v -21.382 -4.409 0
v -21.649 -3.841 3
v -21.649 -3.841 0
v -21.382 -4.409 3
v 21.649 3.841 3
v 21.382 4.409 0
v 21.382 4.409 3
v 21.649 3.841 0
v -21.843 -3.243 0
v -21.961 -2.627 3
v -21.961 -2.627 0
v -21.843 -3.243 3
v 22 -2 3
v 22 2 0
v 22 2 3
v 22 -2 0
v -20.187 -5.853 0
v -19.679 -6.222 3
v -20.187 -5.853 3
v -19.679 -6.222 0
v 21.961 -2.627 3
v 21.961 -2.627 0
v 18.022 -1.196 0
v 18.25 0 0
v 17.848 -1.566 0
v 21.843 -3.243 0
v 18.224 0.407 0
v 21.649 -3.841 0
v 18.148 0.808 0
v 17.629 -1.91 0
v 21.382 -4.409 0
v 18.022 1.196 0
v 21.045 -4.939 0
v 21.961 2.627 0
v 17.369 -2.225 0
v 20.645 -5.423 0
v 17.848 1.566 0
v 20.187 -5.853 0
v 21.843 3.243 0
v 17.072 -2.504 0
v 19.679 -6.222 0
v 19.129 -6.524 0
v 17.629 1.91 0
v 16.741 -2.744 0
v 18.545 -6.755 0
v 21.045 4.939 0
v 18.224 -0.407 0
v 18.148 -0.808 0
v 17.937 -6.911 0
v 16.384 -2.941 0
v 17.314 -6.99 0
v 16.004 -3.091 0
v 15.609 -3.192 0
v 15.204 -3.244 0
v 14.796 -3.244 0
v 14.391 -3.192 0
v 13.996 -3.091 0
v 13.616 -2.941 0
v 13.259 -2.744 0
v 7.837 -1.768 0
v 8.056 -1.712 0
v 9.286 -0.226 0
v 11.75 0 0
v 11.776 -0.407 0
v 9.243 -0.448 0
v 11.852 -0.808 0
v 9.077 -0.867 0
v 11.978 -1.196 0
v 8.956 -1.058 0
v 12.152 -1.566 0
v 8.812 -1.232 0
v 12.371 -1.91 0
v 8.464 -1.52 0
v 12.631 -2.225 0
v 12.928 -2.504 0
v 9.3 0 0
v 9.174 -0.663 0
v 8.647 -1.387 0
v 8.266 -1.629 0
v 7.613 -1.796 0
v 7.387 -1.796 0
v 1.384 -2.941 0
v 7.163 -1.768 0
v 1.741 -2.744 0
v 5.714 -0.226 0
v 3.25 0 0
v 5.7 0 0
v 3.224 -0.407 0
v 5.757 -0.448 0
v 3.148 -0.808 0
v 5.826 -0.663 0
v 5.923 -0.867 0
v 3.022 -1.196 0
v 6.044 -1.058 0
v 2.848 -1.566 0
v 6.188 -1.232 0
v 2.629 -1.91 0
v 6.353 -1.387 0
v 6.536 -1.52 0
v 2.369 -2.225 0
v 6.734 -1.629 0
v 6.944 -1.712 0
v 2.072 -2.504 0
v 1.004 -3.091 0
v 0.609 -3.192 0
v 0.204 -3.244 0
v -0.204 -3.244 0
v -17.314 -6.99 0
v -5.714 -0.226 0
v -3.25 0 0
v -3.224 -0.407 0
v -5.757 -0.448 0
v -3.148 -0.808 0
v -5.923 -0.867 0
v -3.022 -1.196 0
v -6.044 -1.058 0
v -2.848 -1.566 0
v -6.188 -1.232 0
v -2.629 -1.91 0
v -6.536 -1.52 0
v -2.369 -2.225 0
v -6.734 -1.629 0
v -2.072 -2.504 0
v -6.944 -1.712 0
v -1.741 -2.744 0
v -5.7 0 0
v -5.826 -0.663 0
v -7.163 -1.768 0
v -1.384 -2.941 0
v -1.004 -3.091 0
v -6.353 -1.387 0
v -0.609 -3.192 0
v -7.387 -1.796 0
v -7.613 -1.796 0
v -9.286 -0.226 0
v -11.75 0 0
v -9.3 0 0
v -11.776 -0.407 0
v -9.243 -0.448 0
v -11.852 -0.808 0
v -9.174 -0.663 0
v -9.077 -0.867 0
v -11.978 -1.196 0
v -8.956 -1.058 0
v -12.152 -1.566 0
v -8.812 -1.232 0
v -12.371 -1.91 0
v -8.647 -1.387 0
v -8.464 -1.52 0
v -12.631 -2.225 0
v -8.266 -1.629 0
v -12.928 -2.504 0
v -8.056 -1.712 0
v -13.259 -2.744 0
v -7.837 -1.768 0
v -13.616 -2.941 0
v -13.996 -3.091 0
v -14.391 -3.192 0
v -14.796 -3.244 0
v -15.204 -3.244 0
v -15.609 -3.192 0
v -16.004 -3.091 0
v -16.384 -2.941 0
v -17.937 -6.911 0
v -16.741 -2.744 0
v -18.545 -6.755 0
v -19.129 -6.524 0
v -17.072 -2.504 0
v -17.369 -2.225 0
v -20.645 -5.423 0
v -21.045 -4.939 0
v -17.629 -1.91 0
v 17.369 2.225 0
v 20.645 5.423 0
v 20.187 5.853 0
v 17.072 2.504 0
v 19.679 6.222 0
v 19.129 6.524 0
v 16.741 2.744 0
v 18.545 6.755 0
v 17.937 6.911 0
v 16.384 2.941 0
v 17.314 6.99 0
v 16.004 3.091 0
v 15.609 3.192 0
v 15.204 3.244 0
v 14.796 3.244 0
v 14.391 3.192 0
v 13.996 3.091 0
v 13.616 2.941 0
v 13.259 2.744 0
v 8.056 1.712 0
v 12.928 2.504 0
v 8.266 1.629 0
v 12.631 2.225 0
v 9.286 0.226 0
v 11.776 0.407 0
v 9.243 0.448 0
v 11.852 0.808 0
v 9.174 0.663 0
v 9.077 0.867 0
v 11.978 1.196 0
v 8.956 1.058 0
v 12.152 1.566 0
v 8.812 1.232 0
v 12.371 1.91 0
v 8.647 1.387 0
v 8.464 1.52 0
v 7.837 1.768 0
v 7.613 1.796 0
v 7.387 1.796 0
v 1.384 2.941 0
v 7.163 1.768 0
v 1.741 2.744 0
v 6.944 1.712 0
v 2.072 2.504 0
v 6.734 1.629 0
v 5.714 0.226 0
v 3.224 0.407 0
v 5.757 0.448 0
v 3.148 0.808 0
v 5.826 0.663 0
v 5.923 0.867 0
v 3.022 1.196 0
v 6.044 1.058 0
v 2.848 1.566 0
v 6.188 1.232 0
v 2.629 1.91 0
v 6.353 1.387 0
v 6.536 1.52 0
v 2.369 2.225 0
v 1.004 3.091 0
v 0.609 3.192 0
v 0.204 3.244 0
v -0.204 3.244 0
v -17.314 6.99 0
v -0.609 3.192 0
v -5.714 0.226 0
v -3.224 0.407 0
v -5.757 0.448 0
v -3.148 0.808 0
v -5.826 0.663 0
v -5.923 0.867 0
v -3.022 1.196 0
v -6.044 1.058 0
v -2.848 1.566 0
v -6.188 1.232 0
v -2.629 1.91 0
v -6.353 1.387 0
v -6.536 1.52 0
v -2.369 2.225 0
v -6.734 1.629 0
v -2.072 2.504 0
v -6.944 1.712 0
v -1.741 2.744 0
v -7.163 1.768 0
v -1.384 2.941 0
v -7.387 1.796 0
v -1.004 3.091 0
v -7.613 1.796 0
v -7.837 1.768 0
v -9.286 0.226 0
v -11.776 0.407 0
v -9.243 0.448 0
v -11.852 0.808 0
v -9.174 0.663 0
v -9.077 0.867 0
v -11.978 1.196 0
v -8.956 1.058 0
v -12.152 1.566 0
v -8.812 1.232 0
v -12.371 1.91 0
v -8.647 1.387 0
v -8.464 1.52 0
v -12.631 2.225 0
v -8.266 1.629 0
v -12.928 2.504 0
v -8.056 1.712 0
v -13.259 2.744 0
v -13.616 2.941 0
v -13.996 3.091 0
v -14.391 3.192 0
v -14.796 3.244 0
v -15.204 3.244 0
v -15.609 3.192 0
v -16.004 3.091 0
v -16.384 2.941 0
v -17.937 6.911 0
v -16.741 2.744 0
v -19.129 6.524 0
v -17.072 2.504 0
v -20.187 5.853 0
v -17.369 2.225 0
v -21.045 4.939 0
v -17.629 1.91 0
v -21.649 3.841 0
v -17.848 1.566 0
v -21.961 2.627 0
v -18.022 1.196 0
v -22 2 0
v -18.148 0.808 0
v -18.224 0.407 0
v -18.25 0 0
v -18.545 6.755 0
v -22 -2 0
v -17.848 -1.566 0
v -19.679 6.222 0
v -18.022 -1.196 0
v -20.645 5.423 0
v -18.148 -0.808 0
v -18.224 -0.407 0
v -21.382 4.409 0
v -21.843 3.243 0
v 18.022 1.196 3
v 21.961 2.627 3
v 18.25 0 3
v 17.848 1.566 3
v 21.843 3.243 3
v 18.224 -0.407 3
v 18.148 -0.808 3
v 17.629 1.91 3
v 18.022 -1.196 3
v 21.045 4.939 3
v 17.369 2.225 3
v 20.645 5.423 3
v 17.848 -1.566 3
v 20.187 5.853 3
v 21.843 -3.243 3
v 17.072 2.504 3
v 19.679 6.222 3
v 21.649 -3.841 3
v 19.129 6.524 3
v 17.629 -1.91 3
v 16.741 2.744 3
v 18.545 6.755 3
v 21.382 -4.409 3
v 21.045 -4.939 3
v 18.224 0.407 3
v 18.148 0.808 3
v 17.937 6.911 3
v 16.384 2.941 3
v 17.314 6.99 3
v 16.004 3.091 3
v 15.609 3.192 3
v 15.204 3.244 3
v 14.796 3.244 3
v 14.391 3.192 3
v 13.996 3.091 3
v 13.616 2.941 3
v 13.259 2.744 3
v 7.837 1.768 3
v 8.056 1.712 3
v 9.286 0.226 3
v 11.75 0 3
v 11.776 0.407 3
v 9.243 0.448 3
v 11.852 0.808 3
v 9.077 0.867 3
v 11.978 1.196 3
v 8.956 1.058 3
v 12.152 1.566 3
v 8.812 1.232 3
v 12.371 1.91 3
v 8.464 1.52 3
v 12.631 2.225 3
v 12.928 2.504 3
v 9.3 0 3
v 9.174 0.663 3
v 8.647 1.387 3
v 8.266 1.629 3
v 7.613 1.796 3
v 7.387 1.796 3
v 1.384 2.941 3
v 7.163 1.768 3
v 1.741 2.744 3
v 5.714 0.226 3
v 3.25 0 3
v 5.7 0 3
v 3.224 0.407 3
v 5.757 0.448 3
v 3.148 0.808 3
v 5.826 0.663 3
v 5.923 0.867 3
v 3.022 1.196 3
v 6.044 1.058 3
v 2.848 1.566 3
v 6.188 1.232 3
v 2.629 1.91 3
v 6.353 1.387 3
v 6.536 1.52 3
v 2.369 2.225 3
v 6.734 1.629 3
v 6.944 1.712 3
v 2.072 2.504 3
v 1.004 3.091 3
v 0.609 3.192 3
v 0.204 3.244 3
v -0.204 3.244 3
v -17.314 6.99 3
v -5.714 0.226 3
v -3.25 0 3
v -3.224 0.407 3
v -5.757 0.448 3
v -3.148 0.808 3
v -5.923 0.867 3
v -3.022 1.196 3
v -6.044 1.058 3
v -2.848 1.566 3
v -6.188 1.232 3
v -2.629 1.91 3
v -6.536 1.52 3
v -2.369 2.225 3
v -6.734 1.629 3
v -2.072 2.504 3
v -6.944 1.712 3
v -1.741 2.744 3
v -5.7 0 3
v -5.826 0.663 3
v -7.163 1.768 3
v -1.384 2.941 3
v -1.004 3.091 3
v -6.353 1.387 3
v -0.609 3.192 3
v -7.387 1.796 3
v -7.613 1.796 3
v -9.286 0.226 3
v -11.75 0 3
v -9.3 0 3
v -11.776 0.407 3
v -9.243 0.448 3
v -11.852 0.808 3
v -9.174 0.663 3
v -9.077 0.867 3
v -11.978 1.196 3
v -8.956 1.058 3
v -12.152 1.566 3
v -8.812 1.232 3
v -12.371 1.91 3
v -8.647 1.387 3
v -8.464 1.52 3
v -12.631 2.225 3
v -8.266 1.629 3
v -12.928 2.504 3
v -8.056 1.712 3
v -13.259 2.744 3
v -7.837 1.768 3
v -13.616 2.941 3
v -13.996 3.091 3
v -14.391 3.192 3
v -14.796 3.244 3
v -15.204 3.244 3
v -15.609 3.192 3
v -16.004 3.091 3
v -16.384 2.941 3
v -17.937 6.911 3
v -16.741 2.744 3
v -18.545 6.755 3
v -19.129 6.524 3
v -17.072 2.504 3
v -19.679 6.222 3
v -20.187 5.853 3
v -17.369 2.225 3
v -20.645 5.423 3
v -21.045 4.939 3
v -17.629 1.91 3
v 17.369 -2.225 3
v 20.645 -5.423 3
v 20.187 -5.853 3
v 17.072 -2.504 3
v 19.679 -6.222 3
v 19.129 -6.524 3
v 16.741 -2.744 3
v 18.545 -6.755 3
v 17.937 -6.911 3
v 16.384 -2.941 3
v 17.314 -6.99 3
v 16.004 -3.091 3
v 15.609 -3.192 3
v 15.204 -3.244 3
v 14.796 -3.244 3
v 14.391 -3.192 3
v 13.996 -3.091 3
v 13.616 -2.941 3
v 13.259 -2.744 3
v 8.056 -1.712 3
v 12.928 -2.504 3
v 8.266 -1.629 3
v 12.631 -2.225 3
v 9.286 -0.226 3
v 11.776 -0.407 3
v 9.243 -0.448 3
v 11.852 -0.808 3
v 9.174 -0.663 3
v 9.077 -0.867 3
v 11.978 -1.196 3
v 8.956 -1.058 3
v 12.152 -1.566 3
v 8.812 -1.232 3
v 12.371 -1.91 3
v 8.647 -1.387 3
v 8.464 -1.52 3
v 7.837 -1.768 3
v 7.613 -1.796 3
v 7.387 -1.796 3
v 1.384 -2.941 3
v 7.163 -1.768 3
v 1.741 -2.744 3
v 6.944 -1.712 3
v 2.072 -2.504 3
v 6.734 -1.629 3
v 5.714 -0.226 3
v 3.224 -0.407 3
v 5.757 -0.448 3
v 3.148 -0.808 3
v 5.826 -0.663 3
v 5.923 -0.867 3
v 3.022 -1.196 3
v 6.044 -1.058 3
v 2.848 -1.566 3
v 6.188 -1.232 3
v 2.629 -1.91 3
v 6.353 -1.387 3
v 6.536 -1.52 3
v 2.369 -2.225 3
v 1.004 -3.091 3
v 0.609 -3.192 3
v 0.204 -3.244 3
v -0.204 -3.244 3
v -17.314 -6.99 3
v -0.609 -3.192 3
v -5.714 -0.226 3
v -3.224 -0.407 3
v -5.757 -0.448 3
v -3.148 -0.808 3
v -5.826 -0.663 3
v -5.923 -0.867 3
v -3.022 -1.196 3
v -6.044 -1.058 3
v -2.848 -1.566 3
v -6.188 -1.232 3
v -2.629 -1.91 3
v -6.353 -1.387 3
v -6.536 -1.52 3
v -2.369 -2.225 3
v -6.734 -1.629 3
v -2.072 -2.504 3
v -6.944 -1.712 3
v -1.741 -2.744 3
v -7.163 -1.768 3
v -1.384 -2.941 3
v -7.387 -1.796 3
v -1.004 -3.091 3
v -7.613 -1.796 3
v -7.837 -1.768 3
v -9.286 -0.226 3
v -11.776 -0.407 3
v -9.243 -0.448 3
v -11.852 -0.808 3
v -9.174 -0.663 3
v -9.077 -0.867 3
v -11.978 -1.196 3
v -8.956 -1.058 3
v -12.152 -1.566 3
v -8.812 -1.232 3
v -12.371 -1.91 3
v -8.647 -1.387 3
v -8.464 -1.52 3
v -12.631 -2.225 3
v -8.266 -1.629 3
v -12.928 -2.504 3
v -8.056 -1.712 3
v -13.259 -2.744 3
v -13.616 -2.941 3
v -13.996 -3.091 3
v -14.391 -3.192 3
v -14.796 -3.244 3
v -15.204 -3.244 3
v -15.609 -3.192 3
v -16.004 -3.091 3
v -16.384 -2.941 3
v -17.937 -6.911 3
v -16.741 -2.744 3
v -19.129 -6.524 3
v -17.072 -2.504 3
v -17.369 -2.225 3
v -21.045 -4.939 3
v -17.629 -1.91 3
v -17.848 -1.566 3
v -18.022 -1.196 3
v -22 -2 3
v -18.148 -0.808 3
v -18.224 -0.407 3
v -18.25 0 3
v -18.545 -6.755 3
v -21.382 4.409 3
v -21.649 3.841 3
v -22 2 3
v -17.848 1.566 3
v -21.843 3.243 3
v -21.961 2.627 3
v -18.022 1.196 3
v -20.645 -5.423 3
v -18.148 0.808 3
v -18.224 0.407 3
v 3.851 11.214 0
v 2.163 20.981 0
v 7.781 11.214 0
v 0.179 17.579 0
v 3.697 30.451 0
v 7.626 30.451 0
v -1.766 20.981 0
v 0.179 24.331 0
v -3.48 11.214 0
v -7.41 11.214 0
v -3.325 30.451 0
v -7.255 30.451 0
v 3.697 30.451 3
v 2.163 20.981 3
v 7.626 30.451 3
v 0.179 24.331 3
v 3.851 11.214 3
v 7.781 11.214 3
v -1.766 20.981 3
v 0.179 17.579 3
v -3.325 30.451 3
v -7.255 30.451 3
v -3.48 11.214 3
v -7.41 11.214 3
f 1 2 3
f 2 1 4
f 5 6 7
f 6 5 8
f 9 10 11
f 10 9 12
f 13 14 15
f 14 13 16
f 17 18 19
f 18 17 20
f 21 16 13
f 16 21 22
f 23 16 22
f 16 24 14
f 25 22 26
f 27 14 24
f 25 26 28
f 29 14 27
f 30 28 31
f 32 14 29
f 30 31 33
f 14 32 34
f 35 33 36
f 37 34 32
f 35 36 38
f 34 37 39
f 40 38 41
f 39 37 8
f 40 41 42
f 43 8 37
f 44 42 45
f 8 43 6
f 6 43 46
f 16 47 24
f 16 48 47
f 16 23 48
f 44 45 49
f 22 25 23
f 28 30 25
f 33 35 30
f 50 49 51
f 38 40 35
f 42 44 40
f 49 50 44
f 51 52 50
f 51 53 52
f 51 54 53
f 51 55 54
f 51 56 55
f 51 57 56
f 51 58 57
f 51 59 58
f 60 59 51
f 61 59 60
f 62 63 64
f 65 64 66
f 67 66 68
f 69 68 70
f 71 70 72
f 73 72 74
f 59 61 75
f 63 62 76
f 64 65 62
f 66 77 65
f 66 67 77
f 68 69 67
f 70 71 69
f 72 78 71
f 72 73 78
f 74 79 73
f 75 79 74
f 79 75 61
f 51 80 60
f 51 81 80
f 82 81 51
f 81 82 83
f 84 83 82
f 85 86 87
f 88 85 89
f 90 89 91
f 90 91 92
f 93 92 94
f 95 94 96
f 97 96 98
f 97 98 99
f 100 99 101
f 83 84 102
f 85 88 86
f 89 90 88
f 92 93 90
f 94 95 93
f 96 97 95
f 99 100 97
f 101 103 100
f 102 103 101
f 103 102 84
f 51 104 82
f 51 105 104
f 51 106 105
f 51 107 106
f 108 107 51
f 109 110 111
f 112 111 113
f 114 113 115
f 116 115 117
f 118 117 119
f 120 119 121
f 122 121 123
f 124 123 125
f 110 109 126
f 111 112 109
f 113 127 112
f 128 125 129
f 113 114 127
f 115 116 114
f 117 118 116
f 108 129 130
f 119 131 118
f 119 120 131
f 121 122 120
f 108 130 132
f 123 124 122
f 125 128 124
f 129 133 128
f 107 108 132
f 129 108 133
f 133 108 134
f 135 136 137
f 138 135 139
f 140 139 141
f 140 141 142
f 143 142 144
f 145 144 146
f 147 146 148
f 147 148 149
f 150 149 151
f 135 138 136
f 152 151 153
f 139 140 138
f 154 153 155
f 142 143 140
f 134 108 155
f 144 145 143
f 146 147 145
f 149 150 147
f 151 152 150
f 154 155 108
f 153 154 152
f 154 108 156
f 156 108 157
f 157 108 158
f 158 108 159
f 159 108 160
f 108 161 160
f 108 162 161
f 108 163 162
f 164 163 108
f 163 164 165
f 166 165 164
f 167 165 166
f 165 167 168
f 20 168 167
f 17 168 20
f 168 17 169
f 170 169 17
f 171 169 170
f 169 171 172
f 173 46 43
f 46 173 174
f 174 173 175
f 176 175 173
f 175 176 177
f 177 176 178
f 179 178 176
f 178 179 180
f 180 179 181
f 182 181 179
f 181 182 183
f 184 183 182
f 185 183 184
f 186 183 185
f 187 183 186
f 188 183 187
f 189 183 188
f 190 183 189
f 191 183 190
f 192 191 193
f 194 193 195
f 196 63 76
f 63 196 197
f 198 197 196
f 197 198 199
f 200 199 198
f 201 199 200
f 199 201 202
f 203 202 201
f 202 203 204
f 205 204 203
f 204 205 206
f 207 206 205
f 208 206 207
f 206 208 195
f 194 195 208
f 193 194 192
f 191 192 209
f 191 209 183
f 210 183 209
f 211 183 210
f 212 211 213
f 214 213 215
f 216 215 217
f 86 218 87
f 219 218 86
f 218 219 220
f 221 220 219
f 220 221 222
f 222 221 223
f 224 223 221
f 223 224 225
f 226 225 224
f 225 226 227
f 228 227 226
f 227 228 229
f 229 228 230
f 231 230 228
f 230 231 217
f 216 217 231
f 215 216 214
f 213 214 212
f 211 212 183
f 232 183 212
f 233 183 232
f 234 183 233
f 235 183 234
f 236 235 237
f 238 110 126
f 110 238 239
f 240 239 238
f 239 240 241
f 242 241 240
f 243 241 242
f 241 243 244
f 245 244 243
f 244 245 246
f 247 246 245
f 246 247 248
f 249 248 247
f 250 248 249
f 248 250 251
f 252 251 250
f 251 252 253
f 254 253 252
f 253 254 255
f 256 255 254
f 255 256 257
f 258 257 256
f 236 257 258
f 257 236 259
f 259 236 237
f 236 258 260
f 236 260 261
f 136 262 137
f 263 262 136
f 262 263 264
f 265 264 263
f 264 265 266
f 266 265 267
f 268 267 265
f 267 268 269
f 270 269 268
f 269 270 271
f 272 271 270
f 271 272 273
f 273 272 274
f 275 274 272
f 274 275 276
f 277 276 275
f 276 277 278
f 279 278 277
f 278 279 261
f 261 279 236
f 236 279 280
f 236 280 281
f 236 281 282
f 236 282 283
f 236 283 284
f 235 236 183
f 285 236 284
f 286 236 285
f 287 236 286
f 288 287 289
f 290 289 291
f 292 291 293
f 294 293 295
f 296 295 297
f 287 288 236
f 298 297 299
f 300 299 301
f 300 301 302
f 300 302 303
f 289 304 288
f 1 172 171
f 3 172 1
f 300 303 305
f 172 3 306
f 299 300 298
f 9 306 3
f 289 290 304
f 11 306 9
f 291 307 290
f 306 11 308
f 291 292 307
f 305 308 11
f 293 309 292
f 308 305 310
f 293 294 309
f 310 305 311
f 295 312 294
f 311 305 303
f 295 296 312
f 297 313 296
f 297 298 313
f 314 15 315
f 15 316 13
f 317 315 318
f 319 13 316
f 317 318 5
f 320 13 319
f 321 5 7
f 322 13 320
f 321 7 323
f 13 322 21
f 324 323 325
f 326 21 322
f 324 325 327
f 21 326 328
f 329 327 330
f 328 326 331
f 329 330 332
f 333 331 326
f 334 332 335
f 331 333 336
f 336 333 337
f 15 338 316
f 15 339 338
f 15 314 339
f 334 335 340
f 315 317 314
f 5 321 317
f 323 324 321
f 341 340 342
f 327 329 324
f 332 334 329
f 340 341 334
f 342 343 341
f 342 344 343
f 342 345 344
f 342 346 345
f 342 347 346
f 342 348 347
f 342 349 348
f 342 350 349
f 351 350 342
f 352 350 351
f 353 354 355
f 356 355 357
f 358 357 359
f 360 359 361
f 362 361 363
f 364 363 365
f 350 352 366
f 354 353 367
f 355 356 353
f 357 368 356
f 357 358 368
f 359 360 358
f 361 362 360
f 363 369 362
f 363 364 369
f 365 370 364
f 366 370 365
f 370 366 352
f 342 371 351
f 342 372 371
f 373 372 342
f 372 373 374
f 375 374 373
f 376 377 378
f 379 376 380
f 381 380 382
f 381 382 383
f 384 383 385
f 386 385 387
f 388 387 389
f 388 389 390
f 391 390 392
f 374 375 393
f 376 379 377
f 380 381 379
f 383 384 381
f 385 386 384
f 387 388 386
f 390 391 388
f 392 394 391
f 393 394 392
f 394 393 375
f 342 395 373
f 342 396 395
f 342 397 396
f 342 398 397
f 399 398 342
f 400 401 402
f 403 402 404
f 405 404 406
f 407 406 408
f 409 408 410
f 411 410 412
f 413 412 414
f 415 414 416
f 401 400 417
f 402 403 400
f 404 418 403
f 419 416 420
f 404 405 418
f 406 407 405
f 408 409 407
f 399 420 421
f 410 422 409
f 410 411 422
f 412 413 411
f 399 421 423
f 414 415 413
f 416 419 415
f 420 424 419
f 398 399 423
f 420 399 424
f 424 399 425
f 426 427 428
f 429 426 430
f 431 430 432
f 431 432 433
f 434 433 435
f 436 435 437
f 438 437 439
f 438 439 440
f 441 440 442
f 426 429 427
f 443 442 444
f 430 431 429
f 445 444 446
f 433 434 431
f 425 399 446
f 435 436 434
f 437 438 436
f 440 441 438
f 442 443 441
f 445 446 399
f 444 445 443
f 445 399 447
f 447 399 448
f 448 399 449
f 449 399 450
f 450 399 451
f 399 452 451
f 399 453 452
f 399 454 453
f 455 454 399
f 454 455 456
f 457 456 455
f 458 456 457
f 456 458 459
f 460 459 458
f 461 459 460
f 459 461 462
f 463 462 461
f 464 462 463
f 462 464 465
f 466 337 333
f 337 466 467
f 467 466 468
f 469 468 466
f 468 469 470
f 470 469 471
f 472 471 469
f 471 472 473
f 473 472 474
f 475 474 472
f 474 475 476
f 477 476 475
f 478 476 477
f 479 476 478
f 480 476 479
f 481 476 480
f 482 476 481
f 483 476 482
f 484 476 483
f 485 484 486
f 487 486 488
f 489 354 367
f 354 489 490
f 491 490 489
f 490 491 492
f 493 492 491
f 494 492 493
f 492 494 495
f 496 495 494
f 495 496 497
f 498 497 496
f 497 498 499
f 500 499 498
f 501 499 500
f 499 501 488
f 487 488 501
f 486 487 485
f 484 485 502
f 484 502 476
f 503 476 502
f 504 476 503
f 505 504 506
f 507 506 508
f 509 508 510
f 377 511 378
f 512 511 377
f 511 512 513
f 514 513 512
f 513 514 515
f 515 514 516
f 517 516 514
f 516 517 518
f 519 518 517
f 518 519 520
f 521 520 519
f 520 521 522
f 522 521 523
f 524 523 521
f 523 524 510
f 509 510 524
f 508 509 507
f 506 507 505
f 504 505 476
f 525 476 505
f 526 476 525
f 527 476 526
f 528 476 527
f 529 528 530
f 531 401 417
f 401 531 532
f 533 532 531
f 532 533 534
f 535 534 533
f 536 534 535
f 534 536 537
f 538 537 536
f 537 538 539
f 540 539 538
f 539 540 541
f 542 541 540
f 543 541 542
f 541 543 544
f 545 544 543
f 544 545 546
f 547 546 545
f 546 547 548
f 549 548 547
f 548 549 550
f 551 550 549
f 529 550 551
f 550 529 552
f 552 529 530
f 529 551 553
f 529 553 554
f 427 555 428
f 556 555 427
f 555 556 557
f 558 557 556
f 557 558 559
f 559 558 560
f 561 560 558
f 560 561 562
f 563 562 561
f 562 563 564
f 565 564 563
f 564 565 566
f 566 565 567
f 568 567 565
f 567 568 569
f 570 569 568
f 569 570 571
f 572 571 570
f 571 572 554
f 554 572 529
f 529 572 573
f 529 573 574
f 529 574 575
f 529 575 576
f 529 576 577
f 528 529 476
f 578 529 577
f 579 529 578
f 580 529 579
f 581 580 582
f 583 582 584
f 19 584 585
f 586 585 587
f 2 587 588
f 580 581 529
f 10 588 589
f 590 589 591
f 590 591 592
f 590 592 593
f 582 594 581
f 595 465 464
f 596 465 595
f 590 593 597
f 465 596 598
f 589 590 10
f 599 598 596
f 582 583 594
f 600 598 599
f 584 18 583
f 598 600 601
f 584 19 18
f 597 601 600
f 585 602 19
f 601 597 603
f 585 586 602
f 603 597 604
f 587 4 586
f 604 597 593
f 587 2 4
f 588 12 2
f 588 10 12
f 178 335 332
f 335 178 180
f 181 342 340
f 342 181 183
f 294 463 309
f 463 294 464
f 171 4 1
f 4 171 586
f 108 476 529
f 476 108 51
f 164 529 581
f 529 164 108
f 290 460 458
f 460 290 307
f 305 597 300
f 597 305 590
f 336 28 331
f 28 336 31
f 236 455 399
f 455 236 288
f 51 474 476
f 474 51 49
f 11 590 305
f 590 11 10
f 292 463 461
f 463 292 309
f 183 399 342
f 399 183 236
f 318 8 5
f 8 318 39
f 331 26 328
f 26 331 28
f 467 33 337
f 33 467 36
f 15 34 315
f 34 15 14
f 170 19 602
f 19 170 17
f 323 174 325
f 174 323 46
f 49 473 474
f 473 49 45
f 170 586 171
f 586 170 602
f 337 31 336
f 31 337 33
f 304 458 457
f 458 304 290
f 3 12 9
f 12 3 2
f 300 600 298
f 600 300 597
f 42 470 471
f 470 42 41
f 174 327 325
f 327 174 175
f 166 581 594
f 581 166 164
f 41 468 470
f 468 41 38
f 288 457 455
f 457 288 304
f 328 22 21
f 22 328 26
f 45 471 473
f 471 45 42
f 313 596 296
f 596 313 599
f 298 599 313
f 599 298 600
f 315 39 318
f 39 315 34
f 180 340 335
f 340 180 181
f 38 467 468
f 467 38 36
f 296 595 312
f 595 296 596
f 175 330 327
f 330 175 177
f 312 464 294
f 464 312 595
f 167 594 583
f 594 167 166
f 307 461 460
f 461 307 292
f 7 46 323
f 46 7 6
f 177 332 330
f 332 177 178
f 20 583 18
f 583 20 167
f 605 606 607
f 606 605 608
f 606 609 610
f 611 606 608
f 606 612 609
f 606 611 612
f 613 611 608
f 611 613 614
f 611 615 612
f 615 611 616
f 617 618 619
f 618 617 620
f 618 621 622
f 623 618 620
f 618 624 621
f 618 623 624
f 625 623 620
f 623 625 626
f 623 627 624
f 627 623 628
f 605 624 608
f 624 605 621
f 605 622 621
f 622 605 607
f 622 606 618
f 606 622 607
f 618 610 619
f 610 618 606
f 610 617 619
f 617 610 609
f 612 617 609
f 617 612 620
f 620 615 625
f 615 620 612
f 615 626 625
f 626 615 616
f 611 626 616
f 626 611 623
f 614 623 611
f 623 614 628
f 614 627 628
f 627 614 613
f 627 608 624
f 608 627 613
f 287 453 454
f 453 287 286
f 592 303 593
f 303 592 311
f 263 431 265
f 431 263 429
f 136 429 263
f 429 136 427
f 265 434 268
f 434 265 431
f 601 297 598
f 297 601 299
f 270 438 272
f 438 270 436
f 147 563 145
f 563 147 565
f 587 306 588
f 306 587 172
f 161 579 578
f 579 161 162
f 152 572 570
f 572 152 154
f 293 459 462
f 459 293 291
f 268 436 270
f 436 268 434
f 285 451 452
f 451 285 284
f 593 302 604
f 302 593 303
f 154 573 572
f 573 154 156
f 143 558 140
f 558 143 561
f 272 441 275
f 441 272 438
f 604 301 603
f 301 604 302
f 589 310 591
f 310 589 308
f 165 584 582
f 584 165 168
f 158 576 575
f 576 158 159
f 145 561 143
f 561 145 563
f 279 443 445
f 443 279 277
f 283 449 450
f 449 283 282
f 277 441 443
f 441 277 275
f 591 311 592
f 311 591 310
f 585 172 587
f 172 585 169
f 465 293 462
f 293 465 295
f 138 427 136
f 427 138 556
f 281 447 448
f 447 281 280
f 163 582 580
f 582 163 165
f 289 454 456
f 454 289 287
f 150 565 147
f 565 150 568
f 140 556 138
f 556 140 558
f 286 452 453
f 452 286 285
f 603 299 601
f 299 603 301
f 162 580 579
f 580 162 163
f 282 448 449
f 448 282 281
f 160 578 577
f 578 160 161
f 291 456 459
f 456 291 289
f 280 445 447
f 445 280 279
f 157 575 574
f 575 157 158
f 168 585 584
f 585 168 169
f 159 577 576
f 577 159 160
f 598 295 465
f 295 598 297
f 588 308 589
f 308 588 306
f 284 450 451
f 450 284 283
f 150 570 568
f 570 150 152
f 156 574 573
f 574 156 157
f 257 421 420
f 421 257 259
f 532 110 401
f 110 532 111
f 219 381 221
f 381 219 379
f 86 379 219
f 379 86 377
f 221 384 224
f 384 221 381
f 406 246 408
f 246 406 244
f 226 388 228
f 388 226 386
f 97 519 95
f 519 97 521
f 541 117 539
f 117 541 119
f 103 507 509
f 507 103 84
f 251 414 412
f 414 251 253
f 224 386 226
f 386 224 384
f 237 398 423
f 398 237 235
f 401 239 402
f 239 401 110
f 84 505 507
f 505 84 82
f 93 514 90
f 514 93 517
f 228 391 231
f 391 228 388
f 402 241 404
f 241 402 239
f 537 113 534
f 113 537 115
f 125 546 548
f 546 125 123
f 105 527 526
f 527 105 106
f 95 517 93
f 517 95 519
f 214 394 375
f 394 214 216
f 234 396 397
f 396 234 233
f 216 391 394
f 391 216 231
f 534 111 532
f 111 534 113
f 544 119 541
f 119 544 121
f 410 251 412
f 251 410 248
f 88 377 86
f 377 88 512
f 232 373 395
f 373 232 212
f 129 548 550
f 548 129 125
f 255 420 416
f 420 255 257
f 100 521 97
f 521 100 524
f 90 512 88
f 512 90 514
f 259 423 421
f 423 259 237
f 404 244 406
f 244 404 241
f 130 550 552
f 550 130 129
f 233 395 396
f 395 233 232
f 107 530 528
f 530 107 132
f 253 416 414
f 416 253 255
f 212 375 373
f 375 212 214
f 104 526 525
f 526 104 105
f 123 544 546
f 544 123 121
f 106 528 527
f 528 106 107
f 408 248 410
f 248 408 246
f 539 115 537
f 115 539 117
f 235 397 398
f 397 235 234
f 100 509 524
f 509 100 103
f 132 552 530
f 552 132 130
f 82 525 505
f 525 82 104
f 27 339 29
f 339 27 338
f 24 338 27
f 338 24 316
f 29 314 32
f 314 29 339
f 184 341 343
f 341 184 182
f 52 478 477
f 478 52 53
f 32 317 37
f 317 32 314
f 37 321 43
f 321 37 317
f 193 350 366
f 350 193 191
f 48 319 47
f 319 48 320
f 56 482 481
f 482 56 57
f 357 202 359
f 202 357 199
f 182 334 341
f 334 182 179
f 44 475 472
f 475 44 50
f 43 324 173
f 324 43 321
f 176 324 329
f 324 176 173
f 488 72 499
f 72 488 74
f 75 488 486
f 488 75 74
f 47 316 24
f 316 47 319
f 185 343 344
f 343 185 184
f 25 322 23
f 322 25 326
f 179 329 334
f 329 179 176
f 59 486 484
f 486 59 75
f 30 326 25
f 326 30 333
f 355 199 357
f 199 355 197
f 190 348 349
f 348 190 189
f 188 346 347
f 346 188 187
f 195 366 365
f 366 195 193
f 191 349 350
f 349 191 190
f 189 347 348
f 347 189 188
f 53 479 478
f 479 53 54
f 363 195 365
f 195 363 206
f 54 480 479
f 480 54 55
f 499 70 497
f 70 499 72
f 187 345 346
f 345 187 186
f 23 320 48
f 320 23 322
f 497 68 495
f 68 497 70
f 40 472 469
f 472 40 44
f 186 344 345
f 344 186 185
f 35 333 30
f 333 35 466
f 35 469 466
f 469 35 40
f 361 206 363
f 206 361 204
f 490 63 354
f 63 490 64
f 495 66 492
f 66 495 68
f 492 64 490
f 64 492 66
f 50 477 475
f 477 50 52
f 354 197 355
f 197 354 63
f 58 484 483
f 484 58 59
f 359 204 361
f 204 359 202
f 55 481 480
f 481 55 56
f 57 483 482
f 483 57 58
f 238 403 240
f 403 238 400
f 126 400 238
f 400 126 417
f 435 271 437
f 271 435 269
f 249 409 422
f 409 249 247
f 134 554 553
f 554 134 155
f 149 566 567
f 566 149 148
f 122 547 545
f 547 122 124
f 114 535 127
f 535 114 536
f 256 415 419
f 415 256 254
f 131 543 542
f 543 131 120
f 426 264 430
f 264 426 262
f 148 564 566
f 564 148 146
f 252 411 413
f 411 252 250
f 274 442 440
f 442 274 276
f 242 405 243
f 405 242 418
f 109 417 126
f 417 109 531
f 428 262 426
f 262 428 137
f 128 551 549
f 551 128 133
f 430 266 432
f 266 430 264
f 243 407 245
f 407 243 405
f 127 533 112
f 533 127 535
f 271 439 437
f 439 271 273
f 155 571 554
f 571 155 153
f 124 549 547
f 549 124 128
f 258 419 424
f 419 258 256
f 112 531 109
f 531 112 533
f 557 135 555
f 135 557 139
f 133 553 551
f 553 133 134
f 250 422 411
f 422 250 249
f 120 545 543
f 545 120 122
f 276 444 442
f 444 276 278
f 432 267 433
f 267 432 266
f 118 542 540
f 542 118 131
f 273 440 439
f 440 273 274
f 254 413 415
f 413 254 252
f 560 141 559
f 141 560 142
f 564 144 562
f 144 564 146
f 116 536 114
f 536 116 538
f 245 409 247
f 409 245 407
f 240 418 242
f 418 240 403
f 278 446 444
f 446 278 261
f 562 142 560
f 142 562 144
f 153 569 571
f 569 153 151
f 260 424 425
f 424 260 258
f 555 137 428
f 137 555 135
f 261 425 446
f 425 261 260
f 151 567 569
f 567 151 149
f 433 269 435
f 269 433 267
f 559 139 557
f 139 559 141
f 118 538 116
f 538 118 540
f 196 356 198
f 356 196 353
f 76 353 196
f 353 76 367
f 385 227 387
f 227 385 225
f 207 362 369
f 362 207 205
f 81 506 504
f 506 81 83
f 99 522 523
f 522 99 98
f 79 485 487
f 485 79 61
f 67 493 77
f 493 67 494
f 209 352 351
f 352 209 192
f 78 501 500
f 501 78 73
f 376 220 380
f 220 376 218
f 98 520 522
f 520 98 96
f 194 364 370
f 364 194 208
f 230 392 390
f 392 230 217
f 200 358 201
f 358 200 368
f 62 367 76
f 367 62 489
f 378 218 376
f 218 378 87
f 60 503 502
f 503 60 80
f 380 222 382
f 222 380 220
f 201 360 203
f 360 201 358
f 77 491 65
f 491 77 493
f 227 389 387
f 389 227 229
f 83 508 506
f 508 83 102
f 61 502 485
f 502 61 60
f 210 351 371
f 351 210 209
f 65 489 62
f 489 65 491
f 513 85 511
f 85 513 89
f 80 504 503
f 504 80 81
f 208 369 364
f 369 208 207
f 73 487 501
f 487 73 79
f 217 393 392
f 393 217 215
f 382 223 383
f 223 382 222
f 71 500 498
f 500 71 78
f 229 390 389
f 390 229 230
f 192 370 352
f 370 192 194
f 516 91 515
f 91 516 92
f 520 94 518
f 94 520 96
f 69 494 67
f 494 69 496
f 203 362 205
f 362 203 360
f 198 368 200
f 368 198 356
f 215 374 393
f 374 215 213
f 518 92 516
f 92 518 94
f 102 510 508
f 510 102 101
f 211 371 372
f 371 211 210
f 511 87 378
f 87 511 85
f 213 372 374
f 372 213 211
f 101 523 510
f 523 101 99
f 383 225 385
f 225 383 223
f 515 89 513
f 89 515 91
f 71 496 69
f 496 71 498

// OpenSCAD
$fn = 50;


difference() {
	union() {
		hull() {
			translate(v = [-17.0000000000, 2.0000000000, 0]) {
				cylinder(h = 3, r = 5);
			}
			translate(v = [17.0000000000, 2.0000000000, 0]) {
				cylinder(h = 3, r = 5);
			}
			translate(v = [-17.0000000000, -2.0000000000, 0]) {
				cylinder(h = 3, r = 5);
			}
			translate(v = [17.0000000000, -2.0000000000, 0]) {
				cylinder(h = 3, r = 5);
			}
		}
		translate(v = [0, 30.0000000000, 0]) {
			linear_extrude(height = 3) {
				text(font = "DejaVu Sans Mono:style=Bold", halign = "center", size = 19.0000000000, text = "X", valign = "top");
			}
		}
	}
	union() {
		translate(v = [-15.0000000000, 0.0000000000, 0]) {
			translate(v = [0, 0, -100]) {
				cylinder(h = 200, r = 3.2500000000);
			}
		}
		translate(v = [0, 0, -100]) {
			cylinder(h = 200, r = 3.2500000000);
		}
		translate(v = [15.0000000000, 0.0000000000, 0]) {
			translate(v = [0, 0, -100]) {
				cylinder(h = 200, r = 3.2500000000);
			}
		}
		translate(v = [-15.0000000000, 0.0000000000, 0]) {
			translate(v = [0, 0, -100]) {
				cylinder(h = 200, r = 1.8000000000);
			}
		}
		translate(v = [-7.5000000000, 0.0000000000, 0]) {
			translate(v = [0, 0, -100]) {
				cylinder(h = 200, r = 1.8000000000);
			}
		}
		translate(v = [0, 0, -100]) {
			cylinder(h = 200, r = 1.8000000000);
		}
		translate(v = [7.5000000000, 0.0000000000, 0]) {
			translate(v = [0, 0, -100]) {
				cylinder(h = 200, r = 1.8000000000);
			}
		}
		translate(v = [15.0000000000, 0.0000000000, 0]) {
			translate(v = [0, 0, -100]) {
				cylinder(h = 200, r = 1.8000000000);
			}
		}
	}
}
